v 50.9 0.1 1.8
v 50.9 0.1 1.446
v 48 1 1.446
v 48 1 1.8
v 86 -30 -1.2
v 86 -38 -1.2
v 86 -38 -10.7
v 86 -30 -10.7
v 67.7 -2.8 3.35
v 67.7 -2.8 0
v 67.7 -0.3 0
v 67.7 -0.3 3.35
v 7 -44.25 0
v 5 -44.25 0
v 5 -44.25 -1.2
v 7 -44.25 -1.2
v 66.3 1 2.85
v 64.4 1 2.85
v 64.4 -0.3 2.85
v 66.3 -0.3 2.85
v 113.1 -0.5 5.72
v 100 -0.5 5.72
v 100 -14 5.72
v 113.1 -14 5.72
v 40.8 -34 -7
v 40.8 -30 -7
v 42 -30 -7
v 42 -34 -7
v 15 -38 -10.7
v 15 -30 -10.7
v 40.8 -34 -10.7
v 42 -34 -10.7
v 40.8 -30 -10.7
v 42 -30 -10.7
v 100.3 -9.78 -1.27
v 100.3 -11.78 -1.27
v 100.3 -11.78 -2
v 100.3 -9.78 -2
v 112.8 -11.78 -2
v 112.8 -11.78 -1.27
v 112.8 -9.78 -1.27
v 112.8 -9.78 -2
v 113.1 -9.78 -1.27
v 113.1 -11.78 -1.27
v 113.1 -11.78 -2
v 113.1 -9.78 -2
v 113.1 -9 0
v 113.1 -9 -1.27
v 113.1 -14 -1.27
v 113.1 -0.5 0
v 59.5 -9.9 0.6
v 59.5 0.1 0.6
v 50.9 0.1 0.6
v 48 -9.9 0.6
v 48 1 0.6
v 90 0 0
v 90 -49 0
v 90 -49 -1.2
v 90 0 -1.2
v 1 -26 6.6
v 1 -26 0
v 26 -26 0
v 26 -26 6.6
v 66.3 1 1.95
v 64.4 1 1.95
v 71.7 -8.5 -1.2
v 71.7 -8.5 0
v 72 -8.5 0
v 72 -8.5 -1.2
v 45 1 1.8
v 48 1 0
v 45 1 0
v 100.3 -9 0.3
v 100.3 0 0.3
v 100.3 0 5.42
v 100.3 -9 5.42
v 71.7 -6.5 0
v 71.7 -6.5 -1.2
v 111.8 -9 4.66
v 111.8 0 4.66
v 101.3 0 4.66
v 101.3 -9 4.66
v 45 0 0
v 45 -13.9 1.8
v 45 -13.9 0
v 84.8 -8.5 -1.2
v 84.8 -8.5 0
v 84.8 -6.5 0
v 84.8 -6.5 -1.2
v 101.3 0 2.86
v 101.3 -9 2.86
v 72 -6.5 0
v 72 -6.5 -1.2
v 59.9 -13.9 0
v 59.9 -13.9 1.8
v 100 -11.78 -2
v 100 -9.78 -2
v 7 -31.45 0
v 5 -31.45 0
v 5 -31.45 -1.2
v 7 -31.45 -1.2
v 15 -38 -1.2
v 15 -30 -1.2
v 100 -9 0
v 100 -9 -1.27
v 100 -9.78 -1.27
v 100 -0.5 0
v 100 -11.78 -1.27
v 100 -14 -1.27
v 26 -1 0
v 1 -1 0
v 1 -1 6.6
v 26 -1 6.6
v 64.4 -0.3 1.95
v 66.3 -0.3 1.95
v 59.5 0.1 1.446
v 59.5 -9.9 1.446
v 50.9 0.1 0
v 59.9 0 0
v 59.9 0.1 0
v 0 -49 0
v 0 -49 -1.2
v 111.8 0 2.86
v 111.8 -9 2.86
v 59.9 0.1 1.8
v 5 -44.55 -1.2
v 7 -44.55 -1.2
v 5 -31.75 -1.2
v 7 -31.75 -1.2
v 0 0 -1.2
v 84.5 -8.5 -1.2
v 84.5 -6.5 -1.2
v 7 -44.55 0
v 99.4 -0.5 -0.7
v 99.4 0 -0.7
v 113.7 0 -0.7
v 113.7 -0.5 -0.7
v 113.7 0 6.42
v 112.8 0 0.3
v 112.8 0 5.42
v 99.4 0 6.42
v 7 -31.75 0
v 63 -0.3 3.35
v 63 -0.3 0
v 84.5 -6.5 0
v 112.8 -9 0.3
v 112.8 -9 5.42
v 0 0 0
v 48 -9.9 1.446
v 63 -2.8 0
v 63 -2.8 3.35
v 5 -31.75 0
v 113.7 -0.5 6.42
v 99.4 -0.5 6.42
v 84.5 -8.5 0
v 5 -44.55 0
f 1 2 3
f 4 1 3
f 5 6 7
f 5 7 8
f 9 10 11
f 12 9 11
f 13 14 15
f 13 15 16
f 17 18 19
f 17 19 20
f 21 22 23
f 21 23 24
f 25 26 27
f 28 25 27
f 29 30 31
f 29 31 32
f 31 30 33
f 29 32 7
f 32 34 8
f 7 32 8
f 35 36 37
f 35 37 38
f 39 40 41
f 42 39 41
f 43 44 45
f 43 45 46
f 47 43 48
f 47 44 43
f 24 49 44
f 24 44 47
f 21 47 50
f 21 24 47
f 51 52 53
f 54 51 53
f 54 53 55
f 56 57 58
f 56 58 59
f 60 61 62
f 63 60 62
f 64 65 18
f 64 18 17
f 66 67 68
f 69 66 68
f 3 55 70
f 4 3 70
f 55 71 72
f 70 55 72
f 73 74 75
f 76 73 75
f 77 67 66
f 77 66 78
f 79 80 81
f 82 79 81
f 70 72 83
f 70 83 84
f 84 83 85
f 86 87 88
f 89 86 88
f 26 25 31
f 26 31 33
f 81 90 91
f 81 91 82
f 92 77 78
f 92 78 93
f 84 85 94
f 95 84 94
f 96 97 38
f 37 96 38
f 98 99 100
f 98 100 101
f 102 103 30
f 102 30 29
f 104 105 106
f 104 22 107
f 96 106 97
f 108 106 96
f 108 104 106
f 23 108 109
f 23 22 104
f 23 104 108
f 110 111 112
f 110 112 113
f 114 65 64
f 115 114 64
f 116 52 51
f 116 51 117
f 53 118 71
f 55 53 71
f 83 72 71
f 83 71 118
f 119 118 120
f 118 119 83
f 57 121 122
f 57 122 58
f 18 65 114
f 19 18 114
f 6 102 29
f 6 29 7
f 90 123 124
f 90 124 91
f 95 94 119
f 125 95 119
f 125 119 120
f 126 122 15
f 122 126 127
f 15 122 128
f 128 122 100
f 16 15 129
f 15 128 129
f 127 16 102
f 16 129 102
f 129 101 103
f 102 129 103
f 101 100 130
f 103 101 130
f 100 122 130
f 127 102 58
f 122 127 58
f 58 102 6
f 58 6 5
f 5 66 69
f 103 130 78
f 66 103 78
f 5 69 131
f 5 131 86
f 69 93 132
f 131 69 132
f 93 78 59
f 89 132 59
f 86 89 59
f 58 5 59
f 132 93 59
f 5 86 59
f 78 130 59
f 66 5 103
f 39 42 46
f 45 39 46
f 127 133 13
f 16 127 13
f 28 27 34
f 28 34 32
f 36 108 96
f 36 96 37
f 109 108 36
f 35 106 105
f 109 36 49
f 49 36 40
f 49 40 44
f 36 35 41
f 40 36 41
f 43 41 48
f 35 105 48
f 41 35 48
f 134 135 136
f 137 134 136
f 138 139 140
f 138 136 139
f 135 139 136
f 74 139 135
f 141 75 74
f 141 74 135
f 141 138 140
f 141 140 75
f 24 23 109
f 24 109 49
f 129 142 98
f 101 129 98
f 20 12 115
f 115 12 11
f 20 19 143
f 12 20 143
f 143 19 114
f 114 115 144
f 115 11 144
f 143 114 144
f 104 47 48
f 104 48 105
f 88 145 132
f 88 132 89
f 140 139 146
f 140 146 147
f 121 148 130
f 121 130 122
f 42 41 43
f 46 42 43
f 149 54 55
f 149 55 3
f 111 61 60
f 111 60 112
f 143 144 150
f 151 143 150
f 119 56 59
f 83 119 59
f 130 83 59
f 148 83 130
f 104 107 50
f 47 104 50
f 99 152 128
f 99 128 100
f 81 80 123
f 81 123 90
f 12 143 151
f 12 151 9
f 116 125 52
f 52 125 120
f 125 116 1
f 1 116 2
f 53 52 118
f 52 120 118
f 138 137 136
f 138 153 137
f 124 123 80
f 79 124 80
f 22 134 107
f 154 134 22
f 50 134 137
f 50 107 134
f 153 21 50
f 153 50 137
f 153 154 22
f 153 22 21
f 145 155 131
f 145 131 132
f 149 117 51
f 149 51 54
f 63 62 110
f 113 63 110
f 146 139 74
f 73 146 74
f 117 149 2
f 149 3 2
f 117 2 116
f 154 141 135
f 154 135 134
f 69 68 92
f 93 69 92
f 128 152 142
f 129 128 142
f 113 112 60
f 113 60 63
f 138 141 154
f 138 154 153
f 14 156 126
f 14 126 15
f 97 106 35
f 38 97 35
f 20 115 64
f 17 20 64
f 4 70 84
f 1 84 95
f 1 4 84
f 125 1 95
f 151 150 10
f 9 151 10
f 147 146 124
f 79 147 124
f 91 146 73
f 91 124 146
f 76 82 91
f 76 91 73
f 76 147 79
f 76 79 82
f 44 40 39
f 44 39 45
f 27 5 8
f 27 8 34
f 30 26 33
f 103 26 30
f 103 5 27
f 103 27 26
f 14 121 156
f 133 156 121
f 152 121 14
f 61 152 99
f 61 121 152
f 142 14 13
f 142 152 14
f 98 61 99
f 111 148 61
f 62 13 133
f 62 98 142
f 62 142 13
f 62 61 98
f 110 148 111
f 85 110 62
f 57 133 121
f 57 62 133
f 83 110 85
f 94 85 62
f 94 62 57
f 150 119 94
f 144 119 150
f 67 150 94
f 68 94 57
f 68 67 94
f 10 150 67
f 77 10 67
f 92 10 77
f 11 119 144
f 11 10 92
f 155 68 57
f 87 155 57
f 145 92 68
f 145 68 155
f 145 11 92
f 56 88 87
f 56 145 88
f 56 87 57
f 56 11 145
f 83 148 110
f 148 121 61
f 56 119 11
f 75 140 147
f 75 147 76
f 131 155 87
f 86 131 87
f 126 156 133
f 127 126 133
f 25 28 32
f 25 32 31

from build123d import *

# Parameters (mm, degrees)
F0_W           = 2
F0_H           = 0.3
F0_W_2         = 25
F0_H_2         = 25
F0_W_3         = 0.3
F0_H_3         = 2
F0_W_4         = 14.9
F0_H_4         = 13.9
F0_W_5         = 1.2
F0_H_5         = 4
F0_W_6         = 1.9
F1_DEPTH       = 1.2
F2_DEPTH       = 6.6
F3_DEPTH       = 1.8
F4_W           = 2.9
F4_H           = 0.8457996882
F4_W_2         = 8.6
F5_DEPTH       = 10
F5_DEPTH_BACK  = 3
F6_DEPTH       = 10.7
F7_DEPTH       = 7
F8_W           = 13.1
F8_H           = 8.5
F9_DEPTH       = 5.72
F10_DEPTH      = 6.42
F10_DEPTH_BACK = 0.7
F8_W_2         = 0.3
F8_H_2         = 2
F11_DEPTH      = 5.72
F11_DEPTH_BACK = 1.27
F12_DEPTH      = 2
F13_W          = 12.5
F13_H          = 5.12
F13_W_2        = 10.5
F13_H_2        = 1.8
F14_DEPTH      = 9
F15_DEPTH      = 3.35
F16_START      = 1.95
F0_H_6         = 1
F16_DEPTH      = 0.9


with BuildPart() as f1:
    # F0 (on Top) → F1 (new body)
    with BuildSketch(Plane.XY):
        Polygon((45, 0), (0, 0), (0, -49), (90, -49), (90, 0), (66.3, 0), (66.3, -0.3), (67.7, -0.3), (67.7, -2.8), (63, -2.8), (63, -0.3), (64.4, -0.3), (64.4, 0), (59.9, 0), (59.9, -13.9), (45, -13.9), align=None)
        with Locations((6, -44.4)):
            Rectangle(F0_W, F0_H, mode=Mode.SUBTRACT)
        with Locations((6, -31.6)):
            Rectangle(F0_W, F0_H, mode=Mode.SUBTRACT)
        Polygon((86, -30), (86, -38), (15, -38), (15, -30), (40.8, -30), (42, -30), align=None, mode=Mode.SUBTRACT)
        with Locations((13.5, -13.5)):
            Rectangle(F0_W_2, F0_H_2, mode=Mode.SUBTRACT)
        with Locations((71.85, -7.5)):
            Rectangle(F0_W_3, F0_H_3, mode=Mode.SUBTRACT)
        with Locations((84.65, -7.5)):
            Rectangle(F0_W_3, F0_H_3, mode=Mode.SUBTRACT)
        with Locations((13.5, -13.5)):
            Rectangle(F0_W_2, F0_H_2)
        with Locations((52.45, -6.95)):
            Rectangle(F0_W_4, F0_H_4)
        Polygon((15, -38), (86, -38), (86, -30), (42, -30), (42, -34), (40.8, -34), (40.8, -30), (15, -30), align=None)
        with Locations((41.4, -32)):
            Rectangle(F0_W_5, F0_H_5)
        Polygon((66.3, -0.3), (64.4, -0.3), (63, -0.3), (63, -2.8), (67.7, -2.8), (67.7, -0.3), align=None)
        with Locations((65.35, -0.15)):
            Rectangle(F0_W_6, F0_H)
    extrude(amount=-F1_DEPTH)

    # F0 (on Top) → F2 (join)
    with BuildSketch(Plane.XY):
        with Locations((13.5, -13.5)):
            Rectangle(F0_W_2, F0_H_2)
    extrude(amount=F2_DEPTH)

    # F0 (on Top) → F3 (join)
    with BuildSketch(Plane.XY):
        with Locations((52.45, -6.95)):
            Rectangle(F0_W_4, F0_H_4)
        Polygon((45, 1), (45, 0), (59.9, 0), (59.9, 0.1), (50.9, 0.1), (48, 1), align=None)
    extrude(amount=F3_DEPTH)

    # F4 (on face) → F5 (cut, two sides)
    with BuildSketch(Plane(origin=(0, 0.1, 0), x_dir=(-1, 0, 0), z_dir=(0, 1, 0))) as f5_sk:
        with Locations((-49.45, 1.0228998441)):
            Rectangle(F4_W, F4_H)
        with Locations((-55.2, 1.0228998441)):
            Rectangle(F4_W_2, F4_H)
    extrude(amount=-F5_DEPTH, mode=Mode.SUBTRACT)
    extrude(f5_sk.sketch, amount=F5_DEPTH_BACK, mode=Mode.SUBTRACT)

    # F0 (on Top) → F6 (join)
    with BuildSketch(Plane.XY):
        Polygon((15, -38), (86, -38), (86, -30), (42, -30), (42, -34), (40.8, -34), (40.8, -30), (15, -30), align=None)
    extrude(amount=-F6_DEPTH)

    # F0 (on Top) → F7 (join)
    with BuildSketch(Plane.XY):
        with Locations((41.4, -32)):
            Rectangle(F0_W_5, F0_H_5)
    extrude(amount=-F7_DEPTH)

    # F0 (on Top) → F15 (join)
    with BuildSketch(Plane.XY):
        Polygon((66.3, -0.3), (64.4, -0.3), (63, -0.3), (63, -2.8), (67.7, -2.8), (67.7, -0.3), align=None)
    extrude(amount=F15_DEPTH)

    # F0 (on Top) → F16 (join)
    with BuildSketch(Plane.XY.offset(F16_START)):
        with Locations((65.35, 0.5)):
            Rectangle(F0_W_6, F0_H_6)
        with Locations((65.35, -0.15)):
            Rectangle(F0_W_6, F0_H)
    extrude(amount=F16_DEPTH)


with BuildPart() as f9:
    # F8 (on Top) → F9 (new body)
    with BuildSketch(Plane.XY):
        with Locations((106.55, -4.75)):
            Rectangle(F8_W, F8_H)
    extrude(amount=F9_DEPTH)

    # F8 (on Top) → F10 (join, two sides)
    with BuildSketch(Plane.XY) as f10_sk:
        Polygon((113.7, 0), (99.4, 0), (99.4, -0.5), (100, -0.5), (113.1, -0.5), (113.7, -0.5), align=None)
    extrude(amount=F10_DEPTH)
    extrude(f10_sk.sketch, amount=-F10_DEPTH_BACK)

    # F8 (on Top) → F11 (join, two sides)
    with BuildSketch(Plane.XY) as f11_sk:
        Polygon((113.1, -9), (100, -9), (100, -9.78), (100.3, -9.78), (100.3, -11.78), (100, -11.78), (100, -14), (113.1, -14), (113.1, -11.78), (112.8, -11.78), (112.8, -9.78), (113.1, -9.78), align=None)
        with Locations((100.15, -10.78)):
            Rectangle(F8_W_2, F8_H_2)
        with Locations((112.95, -10.78)):
            Rectangle(F8_W_2, F8_H_2)
    extrude(amount=F11_DEPTH)
    extrude(f11_sk.sketch, amount=-F11_DEPTH_BACK)

    # F8 (on Top) → F12 (join)
    with BuildSketch(Plane.XY):
        with Locations((112.95, -10.78)):
            Rectangle(F8_W_2, F8_H_2)
        with Locations((100.15, -10.78)):
            Rectangle(F8_W_2, F8_H_2)
    extrude(amount=-F12_DEPTH)

    # F13 (on face) → F14 (cut)
    with BuildSketch(Plane(origin=(0, 0, 0), x_dir=(-1, 0, 0), z_dir=(0, 1, 0))):
        with Locations((-106.55, 2.86)):
            Rectangle(F13_W, F13_H)
        with Locations((-106.55, 3.76)):
            Rectangle(F13_W_2, F13_H_2, mode=Mode.SUBTRACT)
    extrude(amount=-F14_DEPTH, mode=Mode.SUBTRACT)


solid = Compound([f1.part, f9.part])
